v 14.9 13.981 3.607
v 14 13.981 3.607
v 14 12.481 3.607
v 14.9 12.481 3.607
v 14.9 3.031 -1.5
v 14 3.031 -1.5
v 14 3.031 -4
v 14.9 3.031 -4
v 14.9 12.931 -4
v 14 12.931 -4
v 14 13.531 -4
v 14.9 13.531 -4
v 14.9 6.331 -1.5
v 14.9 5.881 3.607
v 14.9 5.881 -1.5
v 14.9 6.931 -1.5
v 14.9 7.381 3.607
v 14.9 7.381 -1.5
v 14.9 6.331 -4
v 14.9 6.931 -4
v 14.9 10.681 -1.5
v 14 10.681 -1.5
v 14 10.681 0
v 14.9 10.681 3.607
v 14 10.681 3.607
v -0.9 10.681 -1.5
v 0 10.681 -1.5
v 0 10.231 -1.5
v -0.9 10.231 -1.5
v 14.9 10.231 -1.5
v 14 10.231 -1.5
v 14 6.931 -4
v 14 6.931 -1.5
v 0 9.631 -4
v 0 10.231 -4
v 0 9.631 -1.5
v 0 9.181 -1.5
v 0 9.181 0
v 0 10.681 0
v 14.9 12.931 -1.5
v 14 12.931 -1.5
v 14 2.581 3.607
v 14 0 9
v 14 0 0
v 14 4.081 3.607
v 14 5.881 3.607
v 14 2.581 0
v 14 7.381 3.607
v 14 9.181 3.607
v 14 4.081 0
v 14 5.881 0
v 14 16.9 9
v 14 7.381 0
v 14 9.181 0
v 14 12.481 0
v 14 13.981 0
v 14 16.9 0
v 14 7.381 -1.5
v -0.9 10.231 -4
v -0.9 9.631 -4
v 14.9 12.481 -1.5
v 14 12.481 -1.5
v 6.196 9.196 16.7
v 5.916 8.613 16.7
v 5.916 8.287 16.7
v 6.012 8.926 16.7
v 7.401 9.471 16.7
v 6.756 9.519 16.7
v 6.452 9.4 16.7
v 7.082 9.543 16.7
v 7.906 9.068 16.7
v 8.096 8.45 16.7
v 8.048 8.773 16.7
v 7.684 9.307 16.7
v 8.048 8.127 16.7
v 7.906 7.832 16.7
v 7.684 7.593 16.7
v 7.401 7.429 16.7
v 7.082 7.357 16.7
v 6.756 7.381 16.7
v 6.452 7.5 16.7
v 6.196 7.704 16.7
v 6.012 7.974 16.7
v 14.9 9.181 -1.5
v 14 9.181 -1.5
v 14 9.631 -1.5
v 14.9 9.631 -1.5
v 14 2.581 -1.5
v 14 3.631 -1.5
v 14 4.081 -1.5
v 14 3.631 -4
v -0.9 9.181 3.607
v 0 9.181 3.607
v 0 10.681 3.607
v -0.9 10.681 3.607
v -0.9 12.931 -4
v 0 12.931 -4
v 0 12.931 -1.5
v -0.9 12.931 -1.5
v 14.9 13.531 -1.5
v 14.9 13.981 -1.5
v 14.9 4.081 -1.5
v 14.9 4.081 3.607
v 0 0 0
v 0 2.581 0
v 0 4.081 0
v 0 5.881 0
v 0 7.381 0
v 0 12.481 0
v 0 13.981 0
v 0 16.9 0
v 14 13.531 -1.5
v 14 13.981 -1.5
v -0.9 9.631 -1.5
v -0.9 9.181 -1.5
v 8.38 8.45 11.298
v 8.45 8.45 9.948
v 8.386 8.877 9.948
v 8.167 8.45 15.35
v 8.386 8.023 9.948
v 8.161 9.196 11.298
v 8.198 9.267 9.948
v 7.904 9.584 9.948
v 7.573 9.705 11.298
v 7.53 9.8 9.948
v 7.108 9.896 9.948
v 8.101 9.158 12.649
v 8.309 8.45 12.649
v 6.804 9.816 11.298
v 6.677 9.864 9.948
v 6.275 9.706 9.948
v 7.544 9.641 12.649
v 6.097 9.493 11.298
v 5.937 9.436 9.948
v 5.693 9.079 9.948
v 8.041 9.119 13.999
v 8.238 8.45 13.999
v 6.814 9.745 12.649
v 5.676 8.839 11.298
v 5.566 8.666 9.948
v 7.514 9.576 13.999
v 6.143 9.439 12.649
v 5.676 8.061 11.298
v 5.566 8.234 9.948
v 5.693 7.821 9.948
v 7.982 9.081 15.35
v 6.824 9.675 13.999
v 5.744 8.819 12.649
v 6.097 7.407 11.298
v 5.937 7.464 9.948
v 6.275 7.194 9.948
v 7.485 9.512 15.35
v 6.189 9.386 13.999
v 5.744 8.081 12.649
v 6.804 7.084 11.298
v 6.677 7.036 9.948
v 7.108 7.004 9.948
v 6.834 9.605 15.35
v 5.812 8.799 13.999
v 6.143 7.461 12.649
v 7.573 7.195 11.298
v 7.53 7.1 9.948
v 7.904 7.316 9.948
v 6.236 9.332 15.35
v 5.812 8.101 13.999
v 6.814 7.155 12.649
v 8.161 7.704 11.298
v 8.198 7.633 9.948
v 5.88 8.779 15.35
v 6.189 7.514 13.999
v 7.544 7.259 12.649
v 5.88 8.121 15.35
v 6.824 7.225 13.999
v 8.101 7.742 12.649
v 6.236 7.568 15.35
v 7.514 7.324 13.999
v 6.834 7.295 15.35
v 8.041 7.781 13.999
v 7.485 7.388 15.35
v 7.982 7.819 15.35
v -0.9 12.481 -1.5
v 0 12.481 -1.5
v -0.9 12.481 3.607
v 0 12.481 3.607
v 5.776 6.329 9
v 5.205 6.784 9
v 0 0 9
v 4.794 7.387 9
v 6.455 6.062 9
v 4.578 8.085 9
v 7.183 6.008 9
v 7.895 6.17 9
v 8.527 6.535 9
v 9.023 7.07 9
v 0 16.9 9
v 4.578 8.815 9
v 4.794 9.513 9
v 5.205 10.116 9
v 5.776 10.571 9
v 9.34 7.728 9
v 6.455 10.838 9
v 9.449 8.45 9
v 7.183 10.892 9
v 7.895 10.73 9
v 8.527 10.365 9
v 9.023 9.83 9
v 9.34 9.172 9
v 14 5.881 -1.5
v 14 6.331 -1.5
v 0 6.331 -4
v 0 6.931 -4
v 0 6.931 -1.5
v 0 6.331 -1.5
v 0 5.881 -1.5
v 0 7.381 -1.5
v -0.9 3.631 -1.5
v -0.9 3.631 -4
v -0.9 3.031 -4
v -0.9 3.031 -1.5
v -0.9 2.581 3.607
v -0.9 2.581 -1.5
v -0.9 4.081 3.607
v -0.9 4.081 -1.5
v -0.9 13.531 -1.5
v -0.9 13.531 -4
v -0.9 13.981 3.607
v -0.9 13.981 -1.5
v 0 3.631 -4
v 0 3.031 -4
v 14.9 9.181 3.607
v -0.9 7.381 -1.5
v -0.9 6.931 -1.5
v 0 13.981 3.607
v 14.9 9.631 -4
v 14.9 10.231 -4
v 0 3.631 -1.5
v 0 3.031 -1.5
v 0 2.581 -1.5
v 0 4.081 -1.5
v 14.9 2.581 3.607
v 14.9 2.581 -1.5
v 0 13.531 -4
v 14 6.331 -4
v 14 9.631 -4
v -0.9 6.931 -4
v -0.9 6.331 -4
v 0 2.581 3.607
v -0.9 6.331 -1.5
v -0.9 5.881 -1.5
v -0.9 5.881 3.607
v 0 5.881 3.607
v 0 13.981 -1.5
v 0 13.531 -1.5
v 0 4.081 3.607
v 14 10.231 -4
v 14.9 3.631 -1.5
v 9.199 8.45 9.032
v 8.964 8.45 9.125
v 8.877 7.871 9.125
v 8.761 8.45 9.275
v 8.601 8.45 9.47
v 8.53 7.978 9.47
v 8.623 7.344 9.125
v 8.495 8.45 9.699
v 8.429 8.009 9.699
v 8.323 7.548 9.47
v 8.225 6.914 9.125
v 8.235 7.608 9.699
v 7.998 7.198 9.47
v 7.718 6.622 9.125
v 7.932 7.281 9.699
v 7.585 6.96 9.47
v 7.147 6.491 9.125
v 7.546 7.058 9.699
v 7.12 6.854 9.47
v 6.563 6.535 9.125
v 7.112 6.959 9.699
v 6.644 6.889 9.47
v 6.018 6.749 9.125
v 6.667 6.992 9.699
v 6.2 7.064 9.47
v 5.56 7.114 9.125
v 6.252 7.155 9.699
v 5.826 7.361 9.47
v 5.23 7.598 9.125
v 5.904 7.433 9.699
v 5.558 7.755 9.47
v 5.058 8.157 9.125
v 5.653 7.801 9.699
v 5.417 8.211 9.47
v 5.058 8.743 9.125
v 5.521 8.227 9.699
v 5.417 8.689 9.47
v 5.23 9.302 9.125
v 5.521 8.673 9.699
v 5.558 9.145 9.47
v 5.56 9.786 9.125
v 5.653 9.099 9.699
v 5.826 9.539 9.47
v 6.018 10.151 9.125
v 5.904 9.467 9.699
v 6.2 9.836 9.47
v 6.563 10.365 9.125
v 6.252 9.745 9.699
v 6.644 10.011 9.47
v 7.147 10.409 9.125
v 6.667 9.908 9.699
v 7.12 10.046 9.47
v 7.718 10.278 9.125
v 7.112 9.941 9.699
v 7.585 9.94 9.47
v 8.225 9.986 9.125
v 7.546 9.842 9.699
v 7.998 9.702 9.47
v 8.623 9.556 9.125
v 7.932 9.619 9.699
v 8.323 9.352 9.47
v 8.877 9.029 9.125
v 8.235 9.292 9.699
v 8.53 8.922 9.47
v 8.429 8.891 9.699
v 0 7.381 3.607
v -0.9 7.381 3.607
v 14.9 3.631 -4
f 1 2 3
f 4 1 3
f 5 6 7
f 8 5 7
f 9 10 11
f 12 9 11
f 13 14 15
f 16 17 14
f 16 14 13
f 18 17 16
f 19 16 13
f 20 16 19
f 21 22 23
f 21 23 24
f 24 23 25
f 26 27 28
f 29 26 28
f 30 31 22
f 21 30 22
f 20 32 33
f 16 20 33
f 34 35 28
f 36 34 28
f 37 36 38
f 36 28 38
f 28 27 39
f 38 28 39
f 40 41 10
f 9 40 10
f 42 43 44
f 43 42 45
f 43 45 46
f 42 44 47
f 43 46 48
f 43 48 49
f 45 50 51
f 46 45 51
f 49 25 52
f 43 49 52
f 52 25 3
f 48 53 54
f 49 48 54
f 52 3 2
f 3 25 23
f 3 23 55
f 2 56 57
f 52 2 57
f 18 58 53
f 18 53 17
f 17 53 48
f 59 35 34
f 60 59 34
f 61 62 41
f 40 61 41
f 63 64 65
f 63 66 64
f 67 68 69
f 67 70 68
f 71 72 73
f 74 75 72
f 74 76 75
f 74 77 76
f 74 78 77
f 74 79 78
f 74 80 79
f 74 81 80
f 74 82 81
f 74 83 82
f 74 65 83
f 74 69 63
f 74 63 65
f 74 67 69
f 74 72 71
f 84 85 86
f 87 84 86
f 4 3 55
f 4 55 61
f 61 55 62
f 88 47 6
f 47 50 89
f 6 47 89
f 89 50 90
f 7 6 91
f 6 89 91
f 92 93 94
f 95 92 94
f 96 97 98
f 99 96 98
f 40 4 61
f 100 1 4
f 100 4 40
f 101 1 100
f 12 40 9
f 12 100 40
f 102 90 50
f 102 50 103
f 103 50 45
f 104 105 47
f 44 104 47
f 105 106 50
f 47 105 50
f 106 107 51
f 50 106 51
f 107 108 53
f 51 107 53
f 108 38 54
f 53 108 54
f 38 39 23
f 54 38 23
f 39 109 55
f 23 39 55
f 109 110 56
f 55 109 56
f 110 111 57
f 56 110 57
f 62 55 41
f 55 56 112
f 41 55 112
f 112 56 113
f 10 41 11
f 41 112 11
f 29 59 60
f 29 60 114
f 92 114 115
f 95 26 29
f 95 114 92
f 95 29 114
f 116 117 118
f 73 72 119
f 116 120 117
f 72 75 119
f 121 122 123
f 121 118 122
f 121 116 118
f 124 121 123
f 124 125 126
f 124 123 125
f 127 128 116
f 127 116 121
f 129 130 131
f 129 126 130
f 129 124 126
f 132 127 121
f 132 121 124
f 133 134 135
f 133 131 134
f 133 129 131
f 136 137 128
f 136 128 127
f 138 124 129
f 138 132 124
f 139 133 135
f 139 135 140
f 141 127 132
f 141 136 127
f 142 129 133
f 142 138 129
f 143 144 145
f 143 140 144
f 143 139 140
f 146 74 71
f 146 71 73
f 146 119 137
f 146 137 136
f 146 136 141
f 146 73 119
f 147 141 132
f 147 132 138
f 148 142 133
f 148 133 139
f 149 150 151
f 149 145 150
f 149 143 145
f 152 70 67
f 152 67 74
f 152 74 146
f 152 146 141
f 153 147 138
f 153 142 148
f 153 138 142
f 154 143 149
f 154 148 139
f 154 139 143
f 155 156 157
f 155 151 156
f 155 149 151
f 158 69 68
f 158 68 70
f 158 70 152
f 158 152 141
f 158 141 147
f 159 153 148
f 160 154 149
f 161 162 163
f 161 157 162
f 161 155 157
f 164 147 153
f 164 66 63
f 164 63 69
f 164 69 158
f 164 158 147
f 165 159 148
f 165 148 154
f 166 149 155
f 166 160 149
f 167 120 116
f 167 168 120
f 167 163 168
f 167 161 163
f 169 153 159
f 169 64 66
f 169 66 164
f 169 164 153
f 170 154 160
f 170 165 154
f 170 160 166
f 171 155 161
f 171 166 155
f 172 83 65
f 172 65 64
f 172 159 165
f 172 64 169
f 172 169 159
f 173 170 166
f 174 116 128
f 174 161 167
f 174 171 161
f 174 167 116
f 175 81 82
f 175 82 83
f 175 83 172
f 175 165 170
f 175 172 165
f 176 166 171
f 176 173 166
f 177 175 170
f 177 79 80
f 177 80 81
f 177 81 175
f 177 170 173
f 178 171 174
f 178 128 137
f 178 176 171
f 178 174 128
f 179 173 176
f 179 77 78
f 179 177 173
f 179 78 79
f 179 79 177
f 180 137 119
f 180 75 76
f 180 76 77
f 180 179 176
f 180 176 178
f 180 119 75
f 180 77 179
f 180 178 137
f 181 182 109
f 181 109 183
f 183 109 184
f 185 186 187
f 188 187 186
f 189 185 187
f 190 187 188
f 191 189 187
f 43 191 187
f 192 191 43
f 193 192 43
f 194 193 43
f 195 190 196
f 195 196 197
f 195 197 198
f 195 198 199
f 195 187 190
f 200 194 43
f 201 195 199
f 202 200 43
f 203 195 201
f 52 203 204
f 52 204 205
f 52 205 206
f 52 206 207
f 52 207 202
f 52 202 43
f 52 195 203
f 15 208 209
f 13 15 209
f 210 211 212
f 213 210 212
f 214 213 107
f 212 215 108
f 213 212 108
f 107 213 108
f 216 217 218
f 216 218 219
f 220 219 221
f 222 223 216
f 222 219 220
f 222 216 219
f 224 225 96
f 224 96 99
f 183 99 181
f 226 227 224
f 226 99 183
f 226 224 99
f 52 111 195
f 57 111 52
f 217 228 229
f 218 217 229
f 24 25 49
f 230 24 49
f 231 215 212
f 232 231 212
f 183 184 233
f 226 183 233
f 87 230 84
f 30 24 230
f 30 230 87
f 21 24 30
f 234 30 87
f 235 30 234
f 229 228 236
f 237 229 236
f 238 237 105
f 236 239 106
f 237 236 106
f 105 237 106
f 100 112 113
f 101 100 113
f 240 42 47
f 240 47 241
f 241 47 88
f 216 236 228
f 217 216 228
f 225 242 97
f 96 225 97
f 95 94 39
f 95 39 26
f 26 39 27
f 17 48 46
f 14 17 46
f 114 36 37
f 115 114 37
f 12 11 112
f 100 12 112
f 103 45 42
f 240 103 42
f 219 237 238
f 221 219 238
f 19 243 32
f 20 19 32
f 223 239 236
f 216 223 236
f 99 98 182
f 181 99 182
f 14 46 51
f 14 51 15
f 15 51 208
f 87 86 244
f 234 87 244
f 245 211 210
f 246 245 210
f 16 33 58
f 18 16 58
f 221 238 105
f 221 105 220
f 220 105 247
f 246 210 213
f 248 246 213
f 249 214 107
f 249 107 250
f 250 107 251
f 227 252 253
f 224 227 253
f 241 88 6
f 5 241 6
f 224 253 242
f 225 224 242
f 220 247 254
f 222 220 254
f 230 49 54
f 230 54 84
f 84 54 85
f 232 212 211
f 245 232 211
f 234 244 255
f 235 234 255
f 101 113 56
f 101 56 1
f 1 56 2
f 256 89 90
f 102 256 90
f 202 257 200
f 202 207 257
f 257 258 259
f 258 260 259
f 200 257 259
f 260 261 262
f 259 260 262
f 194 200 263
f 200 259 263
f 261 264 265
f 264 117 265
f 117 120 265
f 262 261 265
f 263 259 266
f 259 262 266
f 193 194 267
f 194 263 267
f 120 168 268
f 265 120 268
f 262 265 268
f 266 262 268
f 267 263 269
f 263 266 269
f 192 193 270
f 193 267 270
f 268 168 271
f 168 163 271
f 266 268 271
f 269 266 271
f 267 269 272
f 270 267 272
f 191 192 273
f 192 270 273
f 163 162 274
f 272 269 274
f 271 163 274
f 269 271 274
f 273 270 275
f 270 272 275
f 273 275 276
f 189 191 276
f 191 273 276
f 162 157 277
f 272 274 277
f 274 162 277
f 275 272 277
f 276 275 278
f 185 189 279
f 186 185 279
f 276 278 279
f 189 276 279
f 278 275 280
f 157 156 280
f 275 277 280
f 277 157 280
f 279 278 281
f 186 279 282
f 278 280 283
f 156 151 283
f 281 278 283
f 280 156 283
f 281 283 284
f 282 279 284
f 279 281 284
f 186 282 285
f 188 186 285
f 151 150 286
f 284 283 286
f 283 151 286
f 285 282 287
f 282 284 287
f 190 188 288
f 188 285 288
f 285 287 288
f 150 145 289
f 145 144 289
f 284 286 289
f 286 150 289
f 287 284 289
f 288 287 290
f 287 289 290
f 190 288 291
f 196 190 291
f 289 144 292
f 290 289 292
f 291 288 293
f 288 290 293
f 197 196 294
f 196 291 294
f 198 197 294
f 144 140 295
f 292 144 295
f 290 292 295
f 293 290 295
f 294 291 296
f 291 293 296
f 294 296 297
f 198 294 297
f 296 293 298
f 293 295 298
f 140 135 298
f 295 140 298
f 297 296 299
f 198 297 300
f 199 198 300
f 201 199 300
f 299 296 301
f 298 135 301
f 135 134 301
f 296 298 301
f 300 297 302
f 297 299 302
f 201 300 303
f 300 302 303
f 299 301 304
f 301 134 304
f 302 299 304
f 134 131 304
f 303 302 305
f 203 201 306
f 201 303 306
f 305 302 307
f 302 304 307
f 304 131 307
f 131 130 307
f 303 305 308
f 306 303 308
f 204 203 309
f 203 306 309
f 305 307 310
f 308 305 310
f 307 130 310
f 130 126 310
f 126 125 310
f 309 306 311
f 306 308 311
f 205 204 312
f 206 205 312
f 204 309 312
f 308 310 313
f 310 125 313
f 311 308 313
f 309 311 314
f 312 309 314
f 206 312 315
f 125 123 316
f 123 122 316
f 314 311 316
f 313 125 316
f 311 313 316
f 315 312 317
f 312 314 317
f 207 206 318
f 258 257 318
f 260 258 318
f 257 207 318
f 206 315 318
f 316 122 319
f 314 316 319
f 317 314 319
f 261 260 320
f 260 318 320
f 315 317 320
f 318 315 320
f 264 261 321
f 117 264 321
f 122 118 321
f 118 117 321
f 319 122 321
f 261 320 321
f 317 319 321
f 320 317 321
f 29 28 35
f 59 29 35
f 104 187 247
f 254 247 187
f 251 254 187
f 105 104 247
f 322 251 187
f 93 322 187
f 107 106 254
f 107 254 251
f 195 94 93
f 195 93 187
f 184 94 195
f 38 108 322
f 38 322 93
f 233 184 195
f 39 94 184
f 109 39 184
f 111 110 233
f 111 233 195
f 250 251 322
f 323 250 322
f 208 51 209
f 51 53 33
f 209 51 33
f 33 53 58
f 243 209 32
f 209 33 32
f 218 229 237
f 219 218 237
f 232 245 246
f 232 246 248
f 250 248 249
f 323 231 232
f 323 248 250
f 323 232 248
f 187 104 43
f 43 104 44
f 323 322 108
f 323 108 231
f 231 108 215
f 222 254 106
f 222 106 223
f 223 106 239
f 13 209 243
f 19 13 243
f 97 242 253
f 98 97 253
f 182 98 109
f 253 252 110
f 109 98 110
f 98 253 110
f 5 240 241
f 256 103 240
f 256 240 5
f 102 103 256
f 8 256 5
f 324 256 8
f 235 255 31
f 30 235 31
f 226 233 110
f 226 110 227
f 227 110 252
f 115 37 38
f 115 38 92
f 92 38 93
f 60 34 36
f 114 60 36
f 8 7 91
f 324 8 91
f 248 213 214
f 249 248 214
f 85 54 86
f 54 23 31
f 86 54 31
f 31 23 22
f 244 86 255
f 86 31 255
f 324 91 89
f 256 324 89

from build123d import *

# Parameters (mm, degrees)
ESQUISSE1_W          = 14
ESQUISSE1_H          = 16.9
BASE_EXTRUSION_DEPTH = 9
EXTRUSION1_DEPTH     = 0.9
EXTRUSION2_DEPTH     = 0.9
ESQUISSE6_R          = 1.5
EXTRUSION3_DEPTH     = 7.7
EXTRUSION3_TAPER     = 3
CONG_1_R             = 1


with BuildPart() as part:
    # Esquisse1 → Base-Extrusion (new body)
    with BuildSketch(Plane.XY):
        with Locations((7, 8.45)):
            Rectangle(ESQUISSE1_W, ESQUISSE1_H)
    extrude(amount=BASE_EXTRUSION_DEPTH)

    # Esquisse4 → Extrusion1 (add)
    with BuildSketch(Plane.ZY):
        Polygon((3.607457233, 13.98057371), (-1.5, 13.98057371), (-1.5, 13.53057371), (-4, 13.53057371), (-4, 12.93057371), (-1.5, 12.93057371), (-1.5, 12.48057371), (3.607457233, 12.48057371), align=None)
        Polygon((3.607457233, 10.68057371), (-1.5, 10.68057371), (-1.5, 10.23057371), (-4, 10.23057371), (-4, 9.63057371), (-1.5, 9.63057371), (-1.5, 9.18057371), (3.607457233, 9.18057371), align=None)
        Polygon((3.607457233, 7.38057371), (-1.5, 7.38057371), (-1.5, 6.93057371), (-4, 6.93057371), (-4, 6.33057371), (-1.5, 6.33057371), (-1.5, 5.88057371), (3.607457233, 5.88057371), align=None)
        Polygon((3.607457233, 4.08057371), (-1.5, 4.08057371), (-1.5, 3.63057371), (-4, 3.63057371), (-4, 3.03057371), (-1.5, 3.03057371), (-1.5, 2.58057371), (3.607457233, 2.58057371), align=None)
    extrude(amount=EXTRUSION1_DEPTH)

    # Esquisse5 → Extrusion2 (add)
    with BuildSketch(Plane(origin=(14, 0, 0), x_dir=(0, 0, -1), z_dir=(1, 0, 0))):
        Polygon((1.5, 13.98057371), (-3.607457233, 13.98057371), (-3.607457233, 12.48057371), (1.5, 12.48057371), (1.5, 12.93057371), (4, 12.93057371), (4, 13.53057371), (1.5, 13.53057371), align=None)
        Polygon((1.5, 7.38057371), (-3.607457233, 7.38057371), (-3.607457233, 5.88057371), (1.5, 5.88057371), (1.5, 6.33057371), (4, 6.33057371), (4, 6.93057371), (1.5, 6.93057371), align=None)
        Polygon((-3.607457233, 10.68057371), (-3.607457233, 9.18057371), (1.5, 9.18057371), (1.5, 9.63057371), (4, 9.63057371), (4, 10.23057371), (1.5, 10.23057371), (1.5, 10.68057371), align=None)
        Polygon((-3.607457233, 4.08057371), (-3.607457233, 2.58057371), (1.5, 2.58057371), (1.5, 3.03057371), (4, 3.03057371), (4, 3.63057371), (1.5, 3.63057371), (1.5, 4.08057371), align=None)
    extrude(amount=EXTRUSION2_DEPTH)

    # Esquisse6 → Extrusion3 (add)
    with BuildSketch(Plane.XY.offset(9)):
        with Locations((7, 8.45)):
            Circle(ESQUISSE6_R)
    extrude(amount=EXTRUSION3_DEPTH, taper=EXTRUSION3_TAPER)

    # Congé1
    cong_1_edges = [part.edges().sort_by_distance(p)[0] for p in [
        (5.5, 8.45, 9),
    ]]
    fillet(cong_1_edges, radius=CONG_1_R)


solid = part.part
